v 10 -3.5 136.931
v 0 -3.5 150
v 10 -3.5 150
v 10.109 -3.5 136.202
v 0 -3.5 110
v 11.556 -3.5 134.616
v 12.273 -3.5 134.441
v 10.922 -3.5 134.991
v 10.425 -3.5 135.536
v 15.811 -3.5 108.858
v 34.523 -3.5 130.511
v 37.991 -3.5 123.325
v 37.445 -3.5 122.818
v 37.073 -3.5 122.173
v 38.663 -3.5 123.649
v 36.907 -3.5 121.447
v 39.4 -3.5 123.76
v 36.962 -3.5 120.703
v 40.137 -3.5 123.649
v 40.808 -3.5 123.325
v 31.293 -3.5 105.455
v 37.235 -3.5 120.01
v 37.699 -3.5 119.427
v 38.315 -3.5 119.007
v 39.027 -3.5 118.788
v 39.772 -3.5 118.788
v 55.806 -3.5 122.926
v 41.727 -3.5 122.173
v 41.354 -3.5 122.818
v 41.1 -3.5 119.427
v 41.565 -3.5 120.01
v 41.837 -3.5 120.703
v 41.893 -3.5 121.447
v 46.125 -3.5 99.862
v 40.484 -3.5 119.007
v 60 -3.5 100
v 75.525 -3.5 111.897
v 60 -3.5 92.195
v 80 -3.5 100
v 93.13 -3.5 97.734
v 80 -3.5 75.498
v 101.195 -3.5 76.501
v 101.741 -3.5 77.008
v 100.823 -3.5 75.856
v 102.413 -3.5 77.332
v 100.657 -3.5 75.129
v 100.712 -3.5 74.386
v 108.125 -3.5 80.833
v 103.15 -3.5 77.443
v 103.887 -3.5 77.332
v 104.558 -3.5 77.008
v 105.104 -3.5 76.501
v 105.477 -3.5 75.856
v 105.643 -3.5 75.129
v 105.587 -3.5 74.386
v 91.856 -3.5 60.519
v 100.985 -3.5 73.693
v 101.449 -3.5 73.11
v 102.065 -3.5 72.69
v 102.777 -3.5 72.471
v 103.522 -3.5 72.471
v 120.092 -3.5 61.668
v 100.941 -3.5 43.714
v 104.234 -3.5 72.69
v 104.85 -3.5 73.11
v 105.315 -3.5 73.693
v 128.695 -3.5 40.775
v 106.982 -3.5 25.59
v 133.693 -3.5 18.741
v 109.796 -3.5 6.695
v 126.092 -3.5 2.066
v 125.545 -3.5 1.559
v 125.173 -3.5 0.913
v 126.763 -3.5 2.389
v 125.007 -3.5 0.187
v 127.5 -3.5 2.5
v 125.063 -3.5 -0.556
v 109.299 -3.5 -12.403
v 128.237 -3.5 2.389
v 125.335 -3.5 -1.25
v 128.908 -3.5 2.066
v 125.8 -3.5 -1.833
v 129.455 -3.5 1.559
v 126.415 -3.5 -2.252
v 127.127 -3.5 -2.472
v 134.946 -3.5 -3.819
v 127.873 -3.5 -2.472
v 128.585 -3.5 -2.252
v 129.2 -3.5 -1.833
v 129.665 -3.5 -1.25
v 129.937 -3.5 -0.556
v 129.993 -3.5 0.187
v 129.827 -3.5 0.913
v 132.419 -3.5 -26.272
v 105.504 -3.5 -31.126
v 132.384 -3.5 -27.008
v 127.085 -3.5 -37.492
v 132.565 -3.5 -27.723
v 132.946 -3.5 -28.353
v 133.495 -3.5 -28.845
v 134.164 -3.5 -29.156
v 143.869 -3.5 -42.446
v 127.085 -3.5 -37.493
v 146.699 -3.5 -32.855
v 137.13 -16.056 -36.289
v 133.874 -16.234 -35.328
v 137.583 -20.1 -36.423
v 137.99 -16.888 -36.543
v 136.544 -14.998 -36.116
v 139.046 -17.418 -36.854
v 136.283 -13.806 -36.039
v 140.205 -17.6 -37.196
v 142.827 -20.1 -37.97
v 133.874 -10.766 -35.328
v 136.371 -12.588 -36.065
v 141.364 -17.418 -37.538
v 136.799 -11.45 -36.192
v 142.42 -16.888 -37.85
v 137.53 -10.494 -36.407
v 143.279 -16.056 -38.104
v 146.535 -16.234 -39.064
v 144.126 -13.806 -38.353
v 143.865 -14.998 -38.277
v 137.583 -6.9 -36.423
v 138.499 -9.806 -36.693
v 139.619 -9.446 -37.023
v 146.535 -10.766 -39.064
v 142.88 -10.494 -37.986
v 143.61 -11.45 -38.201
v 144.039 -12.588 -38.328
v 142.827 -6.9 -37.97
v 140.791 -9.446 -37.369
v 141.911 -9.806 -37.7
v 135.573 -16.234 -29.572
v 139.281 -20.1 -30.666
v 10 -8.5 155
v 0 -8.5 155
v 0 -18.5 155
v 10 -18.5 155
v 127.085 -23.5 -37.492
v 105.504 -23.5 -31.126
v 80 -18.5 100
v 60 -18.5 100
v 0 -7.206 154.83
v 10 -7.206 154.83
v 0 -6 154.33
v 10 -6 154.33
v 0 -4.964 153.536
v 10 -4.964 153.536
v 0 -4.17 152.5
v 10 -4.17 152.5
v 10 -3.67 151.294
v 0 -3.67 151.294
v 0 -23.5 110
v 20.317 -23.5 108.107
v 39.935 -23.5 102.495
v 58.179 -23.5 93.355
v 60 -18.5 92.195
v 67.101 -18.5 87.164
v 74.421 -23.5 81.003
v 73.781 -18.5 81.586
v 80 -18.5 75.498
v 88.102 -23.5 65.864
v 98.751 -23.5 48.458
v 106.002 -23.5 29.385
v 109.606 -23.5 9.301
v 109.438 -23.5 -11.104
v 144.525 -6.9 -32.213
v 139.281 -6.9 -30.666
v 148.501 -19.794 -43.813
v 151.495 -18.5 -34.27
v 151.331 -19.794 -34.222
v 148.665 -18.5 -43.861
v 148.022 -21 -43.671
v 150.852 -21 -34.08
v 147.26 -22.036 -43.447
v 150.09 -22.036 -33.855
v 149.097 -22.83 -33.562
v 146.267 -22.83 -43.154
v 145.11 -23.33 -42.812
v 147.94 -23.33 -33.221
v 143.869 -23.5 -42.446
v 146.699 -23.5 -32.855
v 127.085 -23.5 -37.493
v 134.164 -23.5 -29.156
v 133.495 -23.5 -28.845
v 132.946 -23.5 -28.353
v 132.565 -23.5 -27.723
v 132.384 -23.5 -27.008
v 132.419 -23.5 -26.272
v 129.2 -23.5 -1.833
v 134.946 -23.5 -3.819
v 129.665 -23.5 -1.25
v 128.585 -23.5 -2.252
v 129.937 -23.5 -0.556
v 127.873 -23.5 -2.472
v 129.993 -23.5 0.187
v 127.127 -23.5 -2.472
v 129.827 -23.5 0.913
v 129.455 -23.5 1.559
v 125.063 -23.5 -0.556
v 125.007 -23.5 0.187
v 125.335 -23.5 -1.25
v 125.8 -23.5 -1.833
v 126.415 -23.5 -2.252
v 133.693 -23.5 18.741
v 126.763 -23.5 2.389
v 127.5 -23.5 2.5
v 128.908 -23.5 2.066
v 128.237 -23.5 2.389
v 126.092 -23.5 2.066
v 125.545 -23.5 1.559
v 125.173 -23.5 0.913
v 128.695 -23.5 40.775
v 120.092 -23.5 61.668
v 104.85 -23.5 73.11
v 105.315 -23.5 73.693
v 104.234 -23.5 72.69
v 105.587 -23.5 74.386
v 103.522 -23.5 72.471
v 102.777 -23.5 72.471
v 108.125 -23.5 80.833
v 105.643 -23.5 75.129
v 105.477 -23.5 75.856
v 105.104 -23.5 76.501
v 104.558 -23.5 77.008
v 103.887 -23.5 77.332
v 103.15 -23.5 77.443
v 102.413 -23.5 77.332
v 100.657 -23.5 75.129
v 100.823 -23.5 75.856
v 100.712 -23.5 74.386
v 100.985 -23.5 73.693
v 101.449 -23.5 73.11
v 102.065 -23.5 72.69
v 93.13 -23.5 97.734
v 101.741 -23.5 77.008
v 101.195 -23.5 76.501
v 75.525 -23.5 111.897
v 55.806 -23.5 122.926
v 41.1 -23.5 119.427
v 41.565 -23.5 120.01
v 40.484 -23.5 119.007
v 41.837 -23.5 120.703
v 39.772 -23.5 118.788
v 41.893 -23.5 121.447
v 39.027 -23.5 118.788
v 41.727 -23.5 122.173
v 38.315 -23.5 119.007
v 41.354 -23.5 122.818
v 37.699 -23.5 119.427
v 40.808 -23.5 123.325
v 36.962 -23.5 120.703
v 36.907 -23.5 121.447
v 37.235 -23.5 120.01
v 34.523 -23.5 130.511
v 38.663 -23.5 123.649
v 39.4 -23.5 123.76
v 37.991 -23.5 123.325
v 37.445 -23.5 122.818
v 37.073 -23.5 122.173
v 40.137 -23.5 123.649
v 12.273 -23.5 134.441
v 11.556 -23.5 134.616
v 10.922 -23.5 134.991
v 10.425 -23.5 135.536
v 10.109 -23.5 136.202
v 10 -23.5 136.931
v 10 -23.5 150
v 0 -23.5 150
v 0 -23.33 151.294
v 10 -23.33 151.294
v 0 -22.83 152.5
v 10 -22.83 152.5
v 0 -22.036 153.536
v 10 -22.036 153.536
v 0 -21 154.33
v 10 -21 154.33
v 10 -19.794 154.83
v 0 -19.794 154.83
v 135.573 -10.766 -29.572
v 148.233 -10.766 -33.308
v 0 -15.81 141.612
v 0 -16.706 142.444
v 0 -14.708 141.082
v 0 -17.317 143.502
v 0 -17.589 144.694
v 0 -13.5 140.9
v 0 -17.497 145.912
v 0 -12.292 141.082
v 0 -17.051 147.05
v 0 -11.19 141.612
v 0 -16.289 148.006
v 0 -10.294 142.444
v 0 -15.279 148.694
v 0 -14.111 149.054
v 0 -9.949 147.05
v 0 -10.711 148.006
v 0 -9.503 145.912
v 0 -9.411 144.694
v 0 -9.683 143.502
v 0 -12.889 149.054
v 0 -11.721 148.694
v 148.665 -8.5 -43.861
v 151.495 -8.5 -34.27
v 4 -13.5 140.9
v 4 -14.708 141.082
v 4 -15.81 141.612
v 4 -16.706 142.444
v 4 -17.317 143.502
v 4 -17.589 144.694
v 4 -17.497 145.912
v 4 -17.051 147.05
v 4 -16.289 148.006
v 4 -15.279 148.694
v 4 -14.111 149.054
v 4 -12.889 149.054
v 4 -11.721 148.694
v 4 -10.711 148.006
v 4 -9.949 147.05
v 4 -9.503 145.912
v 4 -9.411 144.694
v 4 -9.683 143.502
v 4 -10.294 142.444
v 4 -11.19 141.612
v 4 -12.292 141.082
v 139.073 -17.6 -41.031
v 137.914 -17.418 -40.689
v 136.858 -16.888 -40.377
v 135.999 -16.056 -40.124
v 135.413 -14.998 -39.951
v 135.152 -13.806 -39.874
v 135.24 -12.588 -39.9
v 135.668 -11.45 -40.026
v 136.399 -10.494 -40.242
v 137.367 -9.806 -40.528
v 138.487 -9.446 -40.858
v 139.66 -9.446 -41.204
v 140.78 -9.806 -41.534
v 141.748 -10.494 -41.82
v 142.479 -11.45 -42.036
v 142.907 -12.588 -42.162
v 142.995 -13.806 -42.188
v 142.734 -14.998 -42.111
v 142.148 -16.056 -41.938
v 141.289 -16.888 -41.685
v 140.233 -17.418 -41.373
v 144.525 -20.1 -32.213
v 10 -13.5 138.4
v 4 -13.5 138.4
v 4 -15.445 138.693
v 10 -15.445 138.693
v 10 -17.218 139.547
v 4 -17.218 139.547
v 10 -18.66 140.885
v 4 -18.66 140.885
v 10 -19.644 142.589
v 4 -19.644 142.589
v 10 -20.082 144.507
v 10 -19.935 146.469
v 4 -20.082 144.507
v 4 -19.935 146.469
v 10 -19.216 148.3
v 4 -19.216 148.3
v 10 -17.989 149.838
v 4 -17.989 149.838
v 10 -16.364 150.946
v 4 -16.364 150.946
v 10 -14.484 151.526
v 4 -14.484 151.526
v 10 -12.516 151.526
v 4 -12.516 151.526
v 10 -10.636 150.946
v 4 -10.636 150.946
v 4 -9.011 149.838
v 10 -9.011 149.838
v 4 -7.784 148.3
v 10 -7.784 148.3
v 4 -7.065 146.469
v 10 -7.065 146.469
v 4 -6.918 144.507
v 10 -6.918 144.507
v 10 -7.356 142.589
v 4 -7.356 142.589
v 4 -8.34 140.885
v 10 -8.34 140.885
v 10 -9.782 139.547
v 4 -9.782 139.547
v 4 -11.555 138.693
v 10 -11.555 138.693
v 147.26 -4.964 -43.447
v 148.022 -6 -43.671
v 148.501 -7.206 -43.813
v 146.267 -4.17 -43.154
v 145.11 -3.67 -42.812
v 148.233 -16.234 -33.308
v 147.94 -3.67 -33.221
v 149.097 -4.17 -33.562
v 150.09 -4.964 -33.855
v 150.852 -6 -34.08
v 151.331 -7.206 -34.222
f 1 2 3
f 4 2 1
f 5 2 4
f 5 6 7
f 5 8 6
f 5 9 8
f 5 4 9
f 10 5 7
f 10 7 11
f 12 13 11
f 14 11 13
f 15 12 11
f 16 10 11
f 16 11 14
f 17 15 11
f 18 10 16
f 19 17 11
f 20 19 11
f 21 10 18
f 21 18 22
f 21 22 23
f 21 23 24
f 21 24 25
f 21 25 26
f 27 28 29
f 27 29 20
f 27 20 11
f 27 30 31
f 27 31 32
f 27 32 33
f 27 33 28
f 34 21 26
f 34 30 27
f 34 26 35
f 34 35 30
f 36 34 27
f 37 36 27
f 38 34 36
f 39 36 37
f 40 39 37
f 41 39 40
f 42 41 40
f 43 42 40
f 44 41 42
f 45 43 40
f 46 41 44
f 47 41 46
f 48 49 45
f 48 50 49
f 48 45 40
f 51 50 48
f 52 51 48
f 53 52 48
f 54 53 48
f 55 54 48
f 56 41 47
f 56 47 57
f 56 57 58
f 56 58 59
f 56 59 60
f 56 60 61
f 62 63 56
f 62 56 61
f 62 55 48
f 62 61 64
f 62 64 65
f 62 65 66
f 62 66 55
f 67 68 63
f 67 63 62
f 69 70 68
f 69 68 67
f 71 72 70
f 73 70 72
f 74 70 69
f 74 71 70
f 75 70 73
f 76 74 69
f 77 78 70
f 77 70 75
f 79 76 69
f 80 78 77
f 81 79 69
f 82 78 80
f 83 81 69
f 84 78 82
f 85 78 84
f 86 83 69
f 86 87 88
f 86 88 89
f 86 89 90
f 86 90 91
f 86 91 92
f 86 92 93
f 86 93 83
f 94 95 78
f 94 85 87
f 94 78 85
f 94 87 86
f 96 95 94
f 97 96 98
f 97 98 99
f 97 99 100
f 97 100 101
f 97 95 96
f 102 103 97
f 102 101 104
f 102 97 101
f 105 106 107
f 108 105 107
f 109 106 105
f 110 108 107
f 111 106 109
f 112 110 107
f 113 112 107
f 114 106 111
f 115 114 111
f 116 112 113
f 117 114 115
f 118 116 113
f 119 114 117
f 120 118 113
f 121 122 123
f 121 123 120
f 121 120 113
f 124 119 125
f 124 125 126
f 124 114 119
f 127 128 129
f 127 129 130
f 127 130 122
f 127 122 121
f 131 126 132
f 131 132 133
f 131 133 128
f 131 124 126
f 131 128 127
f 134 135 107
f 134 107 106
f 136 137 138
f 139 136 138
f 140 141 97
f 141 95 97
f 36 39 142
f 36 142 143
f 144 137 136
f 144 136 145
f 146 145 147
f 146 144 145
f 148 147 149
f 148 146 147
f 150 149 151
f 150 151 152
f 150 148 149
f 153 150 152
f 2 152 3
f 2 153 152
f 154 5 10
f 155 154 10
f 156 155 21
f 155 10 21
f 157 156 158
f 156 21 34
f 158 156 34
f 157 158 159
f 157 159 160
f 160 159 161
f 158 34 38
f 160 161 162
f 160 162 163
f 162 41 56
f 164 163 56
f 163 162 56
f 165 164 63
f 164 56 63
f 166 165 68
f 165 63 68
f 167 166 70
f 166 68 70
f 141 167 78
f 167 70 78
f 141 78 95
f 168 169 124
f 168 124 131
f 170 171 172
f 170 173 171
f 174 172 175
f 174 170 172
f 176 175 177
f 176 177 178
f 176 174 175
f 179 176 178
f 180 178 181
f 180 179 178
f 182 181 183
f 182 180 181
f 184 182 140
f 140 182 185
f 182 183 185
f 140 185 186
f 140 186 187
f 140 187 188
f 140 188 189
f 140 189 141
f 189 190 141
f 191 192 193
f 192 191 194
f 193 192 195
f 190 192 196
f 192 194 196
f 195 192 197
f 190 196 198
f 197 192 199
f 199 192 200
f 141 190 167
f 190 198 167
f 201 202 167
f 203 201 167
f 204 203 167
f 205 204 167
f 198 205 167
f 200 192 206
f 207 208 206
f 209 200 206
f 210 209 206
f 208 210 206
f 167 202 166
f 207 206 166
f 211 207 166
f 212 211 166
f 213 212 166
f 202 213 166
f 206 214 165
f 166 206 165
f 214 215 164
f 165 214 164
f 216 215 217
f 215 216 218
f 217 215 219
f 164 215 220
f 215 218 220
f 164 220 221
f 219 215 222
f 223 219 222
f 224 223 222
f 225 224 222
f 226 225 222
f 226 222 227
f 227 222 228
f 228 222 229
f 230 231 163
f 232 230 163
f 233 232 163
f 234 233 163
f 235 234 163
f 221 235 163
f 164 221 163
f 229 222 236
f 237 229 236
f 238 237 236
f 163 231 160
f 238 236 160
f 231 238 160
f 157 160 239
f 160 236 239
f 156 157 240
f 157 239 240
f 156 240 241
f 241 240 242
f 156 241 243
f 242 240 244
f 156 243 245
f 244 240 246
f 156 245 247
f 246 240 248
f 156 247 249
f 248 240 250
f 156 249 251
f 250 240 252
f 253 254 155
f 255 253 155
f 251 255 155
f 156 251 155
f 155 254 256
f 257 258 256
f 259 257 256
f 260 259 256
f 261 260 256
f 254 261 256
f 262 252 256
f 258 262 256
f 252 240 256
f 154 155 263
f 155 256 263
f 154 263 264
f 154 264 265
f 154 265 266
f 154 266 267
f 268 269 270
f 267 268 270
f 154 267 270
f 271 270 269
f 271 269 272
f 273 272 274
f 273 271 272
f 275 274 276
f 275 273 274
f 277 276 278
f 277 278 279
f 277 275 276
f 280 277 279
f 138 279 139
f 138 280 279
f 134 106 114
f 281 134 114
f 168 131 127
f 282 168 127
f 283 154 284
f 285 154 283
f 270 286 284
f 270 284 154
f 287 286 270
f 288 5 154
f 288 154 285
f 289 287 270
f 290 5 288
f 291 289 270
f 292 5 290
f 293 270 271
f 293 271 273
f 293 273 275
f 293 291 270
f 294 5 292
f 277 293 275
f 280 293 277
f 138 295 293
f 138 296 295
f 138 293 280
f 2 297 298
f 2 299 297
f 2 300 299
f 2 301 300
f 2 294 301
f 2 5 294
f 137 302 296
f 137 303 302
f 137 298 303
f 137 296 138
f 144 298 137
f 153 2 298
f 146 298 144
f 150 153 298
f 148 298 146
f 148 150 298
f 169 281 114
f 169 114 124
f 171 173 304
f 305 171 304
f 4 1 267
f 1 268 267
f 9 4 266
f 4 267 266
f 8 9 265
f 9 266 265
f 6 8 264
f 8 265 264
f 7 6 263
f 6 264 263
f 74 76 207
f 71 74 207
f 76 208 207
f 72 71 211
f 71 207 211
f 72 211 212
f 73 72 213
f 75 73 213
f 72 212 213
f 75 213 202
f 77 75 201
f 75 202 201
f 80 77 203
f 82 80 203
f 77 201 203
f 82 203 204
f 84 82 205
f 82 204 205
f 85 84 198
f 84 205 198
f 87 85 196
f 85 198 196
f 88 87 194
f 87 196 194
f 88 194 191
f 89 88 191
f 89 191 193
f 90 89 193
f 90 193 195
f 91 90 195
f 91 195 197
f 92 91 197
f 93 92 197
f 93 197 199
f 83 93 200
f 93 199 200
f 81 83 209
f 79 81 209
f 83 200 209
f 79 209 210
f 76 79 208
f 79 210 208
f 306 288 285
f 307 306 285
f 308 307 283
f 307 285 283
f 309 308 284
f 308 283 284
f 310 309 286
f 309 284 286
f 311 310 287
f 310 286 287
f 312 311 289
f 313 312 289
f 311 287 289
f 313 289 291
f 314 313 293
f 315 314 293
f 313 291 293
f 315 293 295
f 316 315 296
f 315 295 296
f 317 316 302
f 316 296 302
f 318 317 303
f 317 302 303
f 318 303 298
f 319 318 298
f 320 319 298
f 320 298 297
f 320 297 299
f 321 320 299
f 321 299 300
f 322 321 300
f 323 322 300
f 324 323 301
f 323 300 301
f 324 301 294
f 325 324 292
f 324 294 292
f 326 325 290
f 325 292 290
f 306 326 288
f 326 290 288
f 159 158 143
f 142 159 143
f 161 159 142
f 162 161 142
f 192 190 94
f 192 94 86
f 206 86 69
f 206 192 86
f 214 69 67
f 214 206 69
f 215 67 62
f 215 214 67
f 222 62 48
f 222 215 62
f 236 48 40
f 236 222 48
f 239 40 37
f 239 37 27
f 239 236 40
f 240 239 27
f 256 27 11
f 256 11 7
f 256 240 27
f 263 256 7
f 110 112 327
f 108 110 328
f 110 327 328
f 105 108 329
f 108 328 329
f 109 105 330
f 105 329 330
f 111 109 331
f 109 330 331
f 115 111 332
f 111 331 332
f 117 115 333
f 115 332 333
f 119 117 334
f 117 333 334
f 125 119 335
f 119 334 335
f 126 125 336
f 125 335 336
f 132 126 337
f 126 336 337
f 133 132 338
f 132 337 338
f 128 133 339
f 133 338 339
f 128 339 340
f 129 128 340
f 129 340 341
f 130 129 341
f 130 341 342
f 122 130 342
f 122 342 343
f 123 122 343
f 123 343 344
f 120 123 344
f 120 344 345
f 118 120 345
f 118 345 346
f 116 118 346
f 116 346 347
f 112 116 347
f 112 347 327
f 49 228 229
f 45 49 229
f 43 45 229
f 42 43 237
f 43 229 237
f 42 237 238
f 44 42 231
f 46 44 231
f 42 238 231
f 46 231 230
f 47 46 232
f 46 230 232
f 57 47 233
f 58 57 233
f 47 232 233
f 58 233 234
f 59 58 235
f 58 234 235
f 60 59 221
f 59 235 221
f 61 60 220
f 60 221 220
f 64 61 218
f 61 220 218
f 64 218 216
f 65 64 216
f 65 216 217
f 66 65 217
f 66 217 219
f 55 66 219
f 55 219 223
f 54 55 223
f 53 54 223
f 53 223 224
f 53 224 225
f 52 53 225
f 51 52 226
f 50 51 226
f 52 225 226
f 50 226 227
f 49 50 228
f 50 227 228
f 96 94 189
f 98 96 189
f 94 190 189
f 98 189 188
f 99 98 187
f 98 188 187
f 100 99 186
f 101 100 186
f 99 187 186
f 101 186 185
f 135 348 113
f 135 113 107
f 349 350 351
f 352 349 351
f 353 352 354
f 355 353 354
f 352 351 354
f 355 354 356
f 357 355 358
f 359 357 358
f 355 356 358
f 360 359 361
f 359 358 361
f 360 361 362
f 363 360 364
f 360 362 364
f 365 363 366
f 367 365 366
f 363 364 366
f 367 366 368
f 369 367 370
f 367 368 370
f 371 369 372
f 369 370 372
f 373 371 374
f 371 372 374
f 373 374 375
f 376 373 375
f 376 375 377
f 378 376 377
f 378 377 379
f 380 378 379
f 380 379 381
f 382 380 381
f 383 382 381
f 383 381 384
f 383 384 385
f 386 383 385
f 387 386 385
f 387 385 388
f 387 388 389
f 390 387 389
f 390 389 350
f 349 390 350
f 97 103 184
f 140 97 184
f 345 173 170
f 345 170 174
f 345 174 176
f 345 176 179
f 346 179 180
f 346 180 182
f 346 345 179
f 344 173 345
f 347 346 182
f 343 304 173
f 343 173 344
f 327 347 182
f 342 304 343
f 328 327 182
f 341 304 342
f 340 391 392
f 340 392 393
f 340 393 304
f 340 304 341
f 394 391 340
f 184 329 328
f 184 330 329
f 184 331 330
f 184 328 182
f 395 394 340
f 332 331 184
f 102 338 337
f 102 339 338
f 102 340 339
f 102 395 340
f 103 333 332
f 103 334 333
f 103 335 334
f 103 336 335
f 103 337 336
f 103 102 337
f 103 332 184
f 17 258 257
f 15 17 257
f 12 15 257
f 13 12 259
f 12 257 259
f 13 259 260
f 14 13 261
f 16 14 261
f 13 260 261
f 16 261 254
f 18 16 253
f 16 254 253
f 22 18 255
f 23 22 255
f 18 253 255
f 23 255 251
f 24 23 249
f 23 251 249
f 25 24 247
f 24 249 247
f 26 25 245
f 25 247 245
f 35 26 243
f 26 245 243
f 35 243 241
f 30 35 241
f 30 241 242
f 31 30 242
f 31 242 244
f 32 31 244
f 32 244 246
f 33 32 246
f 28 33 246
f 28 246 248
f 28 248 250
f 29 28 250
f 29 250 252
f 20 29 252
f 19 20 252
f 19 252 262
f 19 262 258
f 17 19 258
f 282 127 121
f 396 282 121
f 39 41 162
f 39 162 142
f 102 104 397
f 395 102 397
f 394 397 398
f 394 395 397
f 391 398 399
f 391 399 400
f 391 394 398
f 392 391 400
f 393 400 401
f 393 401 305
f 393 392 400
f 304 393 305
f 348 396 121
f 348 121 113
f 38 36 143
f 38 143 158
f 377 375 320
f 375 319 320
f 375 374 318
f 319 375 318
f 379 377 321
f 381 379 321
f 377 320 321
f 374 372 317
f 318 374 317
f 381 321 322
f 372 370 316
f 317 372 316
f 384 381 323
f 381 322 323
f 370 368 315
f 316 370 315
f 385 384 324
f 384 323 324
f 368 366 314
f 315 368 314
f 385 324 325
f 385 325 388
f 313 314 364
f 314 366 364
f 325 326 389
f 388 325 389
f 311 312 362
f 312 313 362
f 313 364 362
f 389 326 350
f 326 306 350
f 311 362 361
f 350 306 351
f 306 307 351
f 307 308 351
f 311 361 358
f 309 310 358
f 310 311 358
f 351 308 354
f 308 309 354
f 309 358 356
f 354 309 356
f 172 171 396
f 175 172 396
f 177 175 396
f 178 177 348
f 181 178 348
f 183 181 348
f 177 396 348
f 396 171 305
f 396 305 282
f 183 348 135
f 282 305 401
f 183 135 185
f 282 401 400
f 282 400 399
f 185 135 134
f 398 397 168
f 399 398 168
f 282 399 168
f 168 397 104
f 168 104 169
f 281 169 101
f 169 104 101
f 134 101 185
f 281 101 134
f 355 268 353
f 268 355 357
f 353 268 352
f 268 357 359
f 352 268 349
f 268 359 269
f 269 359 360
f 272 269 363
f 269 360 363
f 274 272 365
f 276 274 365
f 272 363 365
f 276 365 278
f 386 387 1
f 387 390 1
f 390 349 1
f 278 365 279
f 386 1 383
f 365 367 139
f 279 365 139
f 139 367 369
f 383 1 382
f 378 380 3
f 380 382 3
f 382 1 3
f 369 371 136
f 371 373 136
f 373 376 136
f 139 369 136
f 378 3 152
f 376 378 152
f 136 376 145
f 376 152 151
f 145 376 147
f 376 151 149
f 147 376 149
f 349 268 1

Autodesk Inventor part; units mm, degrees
ref_plane "YZ Plane" through (0, 0, 0) normal (1, 0, 0) x (0, 1, 0)
ref_plane "XZ Plane" through (0, 0, 0) normal (0, 1, 0) x (-1, 0, 0)
ref_plane "XY Plane" through (0, 0, 0) normal (0, 0, 1) x (1, 0, 0)
sketch "Sketch1" plane through (0, 0, 0) normal (0, 1, 0) x (-1, 0, 0)
  circle A0 centre (0, 0) radius 135
  circle A1 centre (0, 0) radius 110
  dimension "d0" = 270
  dimension "d1" = 220
extrude "Extrusion1" add sketch "Sketch1" along normal mid plane 47
sketch "Sketch2" plane through (0, 0, 0) normal (0, 0, 1) x (1, 0, 0)
  circle A0 centre (0, -20.5) radius 18
  line L0 (-135, -23.5) -> (135, -23.5) projected
  dimension "d4" = 36
  dimension "d38" = 3
extrude "Extrusion2" cut sketch "Sketch2" against normal through all
sketch "Sketch3" plane through (0, 23.5, 0) normal (0, 1, 0) x (1, 0, 0)
  circle A0 centre (0, 0) radius 127.5
  circle A1 centre (-127.5, 0) radius 2
  circle A2 centre (-103.1497, -74.9426) radius 2
  circle A3 centre (-39.3997, -121.2597) radius 2
  circle A4 centre (39.3997, -121.2597) radius 2
  circle A5 centre (103.1497, -74.9426) radius 2
  circle A6 centre (127.5, 0) radius 2
  circle A7 centre (103.1497, 74.9426) radius 2
  circle A8 centre (39.3997, 121.2597) radius 2
  circle A9 centre (-39.3997, 121.2597) radius 2
  circle A10 centre (-103.1497, 74.9426) radius 2
  dimension "d7" = 255
  dimension "d8" = 4
  dimension "d11" = 360
hole "Hole1" at (39.3997, 23.5, 121.2597) at (-39.3997, 23.5, 121.2597) at (-103.1497, 23.5, 74.9426) at (-127.5, 23.5, 0) at (-103.1497, 23.5, -74.9426) at (-39.3997, 23.5, -121.2597) at (39.3997, 23.5, -121.2597) at (103.1497, 23.5, -74.9426) at (127.5, 23.5, 0) at (103.1497, 23.5, 74.9426) direction (0, -1, 0) diameter 5 end through all
sketch "Sketch4" plane through (0, 23.5, 0) normal (0, 1, 0) x (1, 0, 0)
  circle A0 centre (0, 0) radius 140
extrude "Extrusion3" cut sketch "Sketch4" against normal blind 27
sketch "Sketch7" plane through (0, -3.5, 0) normal (0, 1, 0) x (1, 0, 0)
  line L0 (0, 0) -> (70, 0)
  line L1 (80, -100) -> (60, -100)
  line L2 (60, -100) -> (60, 100)
  line L3 (60, 100) -> (80, 100)
  line L4 (80, 100) -> (80, -100)
  line L5 (80, -100) -> (60, 100) construction
  line L6 (60, -100) -> (80, 100) construction
  dimension "d39" = 70
  dimension "d40" = 20
  dimension "d41" = 200
extrude "Extrusion7" cut sketch "Sketch7" against normal blind 15
sketch "Sketch8" plane through (0, -3.5, 0) normal (0, 1, 0) x (1, 0, 0)
  line L0 (-129.4827, -38.1999) -> (129.4827, 38.1999)
  line L1 (0, 134.8703) -> (0, -135)
  arc A0 (-5.9161, 134.8703) -> (5.9161, 134.8703) centre (0, 0) ccw projected
  arc A1 (5.9161, 134.8703) -> (-5.9161, 134.8703) centre (0, 0) ccw
  point P0 (5.9161, 134.8703)
  point P1 (0, 0)
extrude "Extrusion8" cut sketch "Sketch8" against normal through all contours A0 A1 L0 | L0 L1 A0 picked at (-84.5453, -30.4063)
sketch "Sketch9" plane through (0, -3.5, 110) normal (-1, 0, 0) x (0, 0, 1)
  line L0 (-148.1999, 0) -> (25, 0) projected
  line L1 (22.5, 0) -> (40, 0)
  line L2 (45, -5) -> (45, -15)
  line L3 (40, -20) -> (22.5, -20)
  line L4 (22.5, -20) -> (22.5, 0)
  line L5 (25, 0) -> (25, -20) projected
  arc A0 (45, -5) -> (40, 0) centre (40, -5) ccw
  arc A1 (40, -20) -> (45, -15) centre (40, -15) ccw
  point P0 (-110, 3.5)
  point P1 (45, -20)
  point P2 (45, 0)
  point P3 (25, 0)
  dimension "d46" = 22.5
  dimension "d47" = 20
  dimension "d48" = 20
  dimension "d49" = 5
extrude "Extrusion9" add sketch "Sketch9" against normal blind 10
sketch "Sketch10" plane through (105.5044, -23.5, -31.1258) normal (-0.283, 0, -0.9591) x (-0.9591, 0, 0.283)
  line L0 (0, 0) -> (-25, 0) projected
  line L1 (-22.5, 0) -> (-40, 0)
  line L2 (-45, 5) -> (-45, 15)
  line L3 (-40, 20) -> (-22.5, 20)
  line L4 (-22.5, 20) -> (-22.5, 0)
  line L5 (-25, 0) -> (-25, 20) projected
  arc A0 (-40, 20) -> (-45, 15) centre (-40, 15) ccw
  arc A1 (-45, 5) -> (-40, 0) centre (-40, 5) ccw
  point P0 (110, 23.5)
  point P1 (-45, 20)
  point P2 (-45, 0)
  point P3 (-25, 0)
  dimension "d52" = 22.5
  dimension "d53" = 20
  dimension "d54" = 20
  dimension "d55" = 5
extrude "Extrusion10" add sketch "Sketch10" against normal blind 10
fillet "Fillet1" radius 2.5 2 edges at (131.9566, -13.5, -28.5036) (10, -13.5, 134.6291)
sketch "Sketch11" plane through (10, -3.5, 110) normal (1, 0, 0) x (0, 0, -1)
  line L0 (-45, -5) -> (-45, -15) projected
  line L1 (-40, -20) -> (-26.9306, -20) projected
  point P0 (110, 3.5)
  point P1 (-35, -10)
  dimension "d59" = 10
  dimension "d60" = 10
hole "Hole2" at (10, -13.5, 145) direction (-1, 0, 0) diameter 8.2 end through all counterbore diameter 13.2 counterbore depth 6
sketch "Sketch12" plane through (108.334, -23.5, -21.5345) normal (0.283, 0, 0.9591) x (0.9591, 0, -0.283)
  line L0 (41.6, 7.2662) -> (37.7338, 3.4)
  line L1 (37.7338, 3.4) -> (32.2662, 3.4)
  line L2 (32.2662, 3.4) -> (28.4, 7.2662)
  line L3 (28.4, 7.2662) -> (28.4, 12.7338)
  line L4 (28.4, 12.7338) -> (32.2662, 16.6)
  line L5 (32.2662, 16.6) -> (37.7338, 16.6)
  line L6 (37.7338, 16.6) -> (41.6, 12.7338)
  line L7 (41.6, 12.7338) -> (41.6, 7.2662)
  line L8 (45, 5) -> (45, 15) projected
  line L9 (26.9306, 0) -> (40, 0) projected
  point P0 (-110, 23.5)
  point P1 (35, 10)
  dimension "d68" = 10
  dimension "d69" = 10
  dimension "d70" = 13.2
extrude "Extrusion11" cut sketch "Sketch12" against normal blind 6
sketch "Sketch13" plane through (106.6363, -23.5, -27.2893) normal (0.283, 0, 0.9591) x (0.9591, 0, -0.283)
  line L0 (26.9306, 0) -> (40, 0) projected
  line L1 (45, 5) -> (45, 15) projected
  point P0 (-110, 23.5)
  point P1 (35, 10)
  dimension "d73" = 10
  dimension "d74" = 10
hole "Hole3" at (140.2059, -13.5, -37.1929) direction (-0.283, 0, -0.9591) diameter 8.2 end through all
properties part number "Cylinder Spacer Bottom_Q3"
